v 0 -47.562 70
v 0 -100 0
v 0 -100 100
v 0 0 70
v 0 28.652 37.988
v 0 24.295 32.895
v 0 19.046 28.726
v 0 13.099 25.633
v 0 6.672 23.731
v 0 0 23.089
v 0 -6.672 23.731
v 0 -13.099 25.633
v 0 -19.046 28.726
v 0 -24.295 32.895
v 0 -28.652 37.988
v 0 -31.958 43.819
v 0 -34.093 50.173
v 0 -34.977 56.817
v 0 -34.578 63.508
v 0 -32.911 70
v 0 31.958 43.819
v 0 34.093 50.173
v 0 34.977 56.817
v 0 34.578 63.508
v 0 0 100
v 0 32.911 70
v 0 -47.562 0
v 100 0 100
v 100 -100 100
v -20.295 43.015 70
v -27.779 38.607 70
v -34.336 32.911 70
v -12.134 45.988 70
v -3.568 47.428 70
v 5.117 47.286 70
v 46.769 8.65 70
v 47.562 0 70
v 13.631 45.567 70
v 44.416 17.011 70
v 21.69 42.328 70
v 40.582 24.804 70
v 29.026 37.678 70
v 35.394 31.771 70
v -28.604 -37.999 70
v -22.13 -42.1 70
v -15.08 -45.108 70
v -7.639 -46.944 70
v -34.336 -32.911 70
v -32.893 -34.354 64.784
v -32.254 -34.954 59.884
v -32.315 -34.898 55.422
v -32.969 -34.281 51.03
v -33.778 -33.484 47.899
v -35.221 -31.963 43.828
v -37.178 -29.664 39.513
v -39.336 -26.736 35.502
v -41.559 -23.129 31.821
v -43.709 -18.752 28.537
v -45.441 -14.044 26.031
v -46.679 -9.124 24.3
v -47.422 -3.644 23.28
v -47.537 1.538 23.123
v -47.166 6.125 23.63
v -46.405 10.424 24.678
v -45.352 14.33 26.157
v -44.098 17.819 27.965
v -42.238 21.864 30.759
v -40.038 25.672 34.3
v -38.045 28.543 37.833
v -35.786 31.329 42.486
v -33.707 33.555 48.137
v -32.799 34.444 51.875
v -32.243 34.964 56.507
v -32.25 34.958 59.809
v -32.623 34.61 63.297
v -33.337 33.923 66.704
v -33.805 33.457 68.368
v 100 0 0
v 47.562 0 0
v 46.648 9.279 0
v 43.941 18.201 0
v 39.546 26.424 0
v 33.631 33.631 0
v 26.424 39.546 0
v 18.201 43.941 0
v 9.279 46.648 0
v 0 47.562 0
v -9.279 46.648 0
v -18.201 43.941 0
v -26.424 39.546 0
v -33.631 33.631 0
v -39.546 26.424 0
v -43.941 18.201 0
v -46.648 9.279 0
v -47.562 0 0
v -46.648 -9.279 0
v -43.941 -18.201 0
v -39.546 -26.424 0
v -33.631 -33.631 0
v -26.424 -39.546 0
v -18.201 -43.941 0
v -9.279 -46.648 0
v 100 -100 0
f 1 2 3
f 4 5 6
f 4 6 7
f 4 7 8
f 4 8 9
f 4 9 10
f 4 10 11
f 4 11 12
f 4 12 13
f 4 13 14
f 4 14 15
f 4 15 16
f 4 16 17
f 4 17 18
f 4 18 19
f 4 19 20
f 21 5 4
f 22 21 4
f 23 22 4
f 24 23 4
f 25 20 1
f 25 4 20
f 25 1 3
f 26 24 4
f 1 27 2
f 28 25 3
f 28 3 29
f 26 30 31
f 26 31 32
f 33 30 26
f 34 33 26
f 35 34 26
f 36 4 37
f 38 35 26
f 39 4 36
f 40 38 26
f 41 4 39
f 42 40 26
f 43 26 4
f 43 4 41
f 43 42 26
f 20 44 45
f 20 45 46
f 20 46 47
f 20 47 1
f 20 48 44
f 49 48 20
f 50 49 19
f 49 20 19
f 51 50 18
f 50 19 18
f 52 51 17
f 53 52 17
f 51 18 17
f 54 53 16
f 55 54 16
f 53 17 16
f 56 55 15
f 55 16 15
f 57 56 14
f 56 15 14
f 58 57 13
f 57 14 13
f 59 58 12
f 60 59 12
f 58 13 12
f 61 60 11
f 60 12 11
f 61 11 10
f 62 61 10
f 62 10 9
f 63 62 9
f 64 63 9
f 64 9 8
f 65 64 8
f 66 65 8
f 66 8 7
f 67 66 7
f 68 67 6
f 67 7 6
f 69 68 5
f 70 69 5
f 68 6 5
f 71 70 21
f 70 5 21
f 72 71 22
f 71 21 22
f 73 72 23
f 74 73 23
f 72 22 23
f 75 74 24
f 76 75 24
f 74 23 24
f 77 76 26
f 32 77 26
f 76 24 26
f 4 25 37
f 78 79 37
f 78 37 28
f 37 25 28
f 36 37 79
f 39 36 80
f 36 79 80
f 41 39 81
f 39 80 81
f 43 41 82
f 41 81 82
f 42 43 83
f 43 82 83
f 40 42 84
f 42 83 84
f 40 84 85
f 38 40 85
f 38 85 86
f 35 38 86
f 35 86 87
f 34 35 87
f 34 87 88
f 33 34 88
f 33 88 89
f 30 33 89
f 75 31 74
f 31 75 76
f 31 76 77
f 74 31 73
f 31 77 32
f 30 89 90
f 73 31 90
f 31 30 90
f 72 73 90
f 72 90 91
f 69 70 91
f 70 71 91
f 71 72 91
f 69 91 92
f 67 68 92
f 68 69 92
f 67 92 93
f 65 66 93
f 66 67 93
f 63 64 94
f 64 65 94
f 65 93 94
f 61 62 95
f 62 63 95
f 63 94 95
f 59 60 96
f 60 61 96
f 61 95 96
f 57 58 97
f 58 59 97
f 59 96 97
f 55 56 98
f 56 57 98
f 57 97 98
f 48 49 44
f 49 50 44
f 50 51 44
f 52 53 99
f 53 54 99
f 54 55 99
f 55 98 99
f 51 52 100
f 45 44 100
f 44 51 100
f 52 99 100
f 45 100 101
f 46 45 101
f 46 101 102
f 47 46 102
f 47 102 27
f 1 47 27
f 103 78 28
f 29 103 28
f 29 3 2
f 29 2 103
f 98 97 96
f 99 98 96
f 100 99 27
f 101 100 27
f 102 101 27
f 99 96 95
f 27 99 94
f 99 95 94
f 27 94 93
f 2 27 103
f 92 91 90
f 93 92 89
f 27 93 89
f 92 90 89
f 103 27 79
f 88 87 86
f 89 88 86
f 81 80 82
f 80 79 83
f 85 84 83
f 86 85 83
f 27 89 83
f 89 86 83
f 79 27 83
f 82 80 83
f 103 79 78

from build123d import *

# Parameters (mm, degrees)
F0_W     = 100
F0_H     = 100
F1_DEPTH = 100
F2_R     = 47.40298
F3_DEPTH = 70
F4_R     = 47.561865
F5_DEPTH = 70
F6_R     = 35
F7_DEPTH = 47.562865


with BuildPart() as f1:
    # F0 (on Front) → F1 (new body)
    with BuildSketch(Plane.XZ):
        with Locations((50, 50)):
            Rectangle(F0_W, F0_H)
    extrude(amount=F1_DEPTH)

    # F2 (on Top) → F3 (join)
    with BuildSketch(Plane.XY):
        Circle(F2_R)
    extrude(amount=F3_DEPTH)

    # F4 (on Top) → F5 (join)
    with BuildSketch(Plane.XY):
        Circle(F4_R)
    extrude(amount=F5_DEPTH)

    # F6 (on Right) → F7 (cut, through all)
    with BuildSketch(Plane.YZ):
        with Locations((0, 58.089419)):
            Circle(F6_R)
    extrude(amount=-F7_DEPTH, mode=Mode.SUBTRACT)


solid = f1.part
